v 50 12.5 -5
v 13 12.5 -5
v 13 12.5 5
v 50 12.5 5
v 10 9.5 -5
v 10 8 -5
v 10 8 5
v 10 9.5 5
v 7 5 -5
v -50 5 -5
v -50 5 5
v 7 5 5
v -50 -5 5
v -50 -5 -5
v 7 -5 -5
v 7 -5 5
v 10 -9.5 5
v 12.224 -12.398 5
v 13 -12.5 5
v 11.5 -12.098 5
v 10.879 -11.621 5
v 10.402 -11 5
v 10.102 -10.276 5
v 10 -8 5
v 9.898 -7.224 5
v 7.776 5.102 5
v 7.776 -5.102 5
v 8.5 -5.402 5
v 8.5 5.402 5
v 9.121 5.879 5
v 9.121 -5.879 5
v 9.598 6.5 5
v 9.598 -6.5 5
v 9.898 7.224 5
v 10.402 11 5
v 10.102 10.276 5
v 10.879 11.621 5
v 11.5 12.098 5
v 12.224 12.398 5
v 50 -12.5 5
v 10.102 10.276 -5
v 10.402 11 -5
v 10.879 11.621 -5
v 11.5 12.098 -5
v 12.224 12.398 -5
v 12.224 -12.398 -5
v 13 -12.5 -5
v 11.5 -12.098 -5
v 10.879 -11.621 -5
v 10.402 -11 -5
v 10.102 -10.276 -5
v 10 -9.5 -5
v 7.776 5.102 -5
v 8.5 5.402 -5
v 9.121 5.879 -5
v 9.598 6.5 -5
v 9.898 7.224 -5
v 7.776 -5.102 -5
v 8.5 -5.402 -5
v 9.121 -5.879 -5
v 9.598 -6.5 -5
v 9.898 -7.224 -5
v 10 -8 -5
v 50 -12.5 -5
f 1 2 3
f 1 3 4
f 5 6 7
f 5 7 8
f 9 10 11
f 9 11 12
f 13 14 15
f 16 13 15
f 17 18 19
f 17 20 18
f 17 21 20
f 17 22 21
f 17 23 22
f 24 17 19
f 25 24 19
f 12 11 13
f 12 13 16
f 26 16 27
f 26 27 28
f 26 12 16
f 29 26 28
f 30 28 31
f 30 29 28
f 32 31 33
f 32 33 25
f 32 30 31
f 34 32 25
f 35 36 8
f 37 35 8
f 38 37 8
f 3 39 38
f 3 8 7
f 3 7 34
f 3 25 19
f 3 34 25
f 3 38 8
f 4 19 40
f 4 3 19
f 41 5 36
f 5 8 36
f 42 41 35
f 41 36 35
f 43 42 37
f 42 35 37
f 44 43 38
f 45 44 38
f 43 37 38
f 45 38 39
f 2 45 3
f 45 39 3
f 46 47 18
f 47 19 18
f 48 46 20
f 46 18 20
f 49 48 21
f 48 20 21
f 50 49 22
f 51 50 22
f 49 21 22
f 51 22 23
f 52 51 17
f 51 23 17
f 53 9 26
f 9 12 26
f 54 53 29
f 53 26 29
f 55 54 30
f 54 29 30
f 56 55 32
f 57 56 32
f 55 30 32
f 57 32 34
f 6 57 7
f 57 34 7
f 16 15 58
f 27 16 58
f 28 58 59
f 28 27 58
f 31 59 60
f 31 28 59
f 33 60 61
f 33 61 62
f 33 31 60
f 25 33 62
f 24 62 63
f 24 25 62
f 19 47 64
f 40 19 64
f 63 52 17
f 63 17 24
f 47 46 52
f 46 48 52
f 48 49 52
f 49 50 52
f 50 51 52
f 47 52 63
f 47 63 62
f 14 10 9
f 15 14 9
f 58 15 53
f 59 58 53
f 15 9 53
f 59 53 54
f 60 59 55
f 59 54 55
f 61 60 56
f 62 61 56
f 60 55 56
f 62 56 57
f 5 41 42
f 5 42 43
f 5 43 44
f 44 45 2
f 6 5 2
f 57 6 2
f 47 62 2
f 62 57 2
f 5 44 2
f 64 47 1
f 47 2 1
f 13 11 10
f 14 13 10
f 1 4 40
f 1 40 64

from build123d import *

# Parameters (mm, degrees)
SKETCH2_W               = 100
SKETCH2_H               = 10
BOSS_EXTRUDE2_DEPTH     = 12.5
CUT_EXTRUDE3_DEPTH      = 53.5
CUT_EXTRUDE3_DEPTH_BACK = 53.5
SKETCH6_W               = 60
SKETCH6_H               = 7.5
FILLET2_R               = 3


with BuildPart() as part:
    # Sketch2 → Boss-Extrude2 (new, symmetric)
    with BuildSketch(Plane(origin=(0, 0, 0), x_dir=(1, 0, 0), z_dir=(0, 1, 0))):
        Rectangle(SKETCH2_W, SKETCH2_H)
    extrude(amount=BOSS_EXTRUDE2_DEPTH, both=True)

    # Sketch6 → Cut-Extrude3 (cut, two sides: drawn at the far end of the back side and taken through both)
    with BuildSketch(Plane.XY.offset(5).offset(-CUT_EXTRUDE3_DEPTH_BACK)):
        with Locations((-20, 8.75)):
            Rectangle(SKETCH6_W, SKETCH6_H)
        with Locations((-20, -8.75)):
            Rectangle(SKETCH6_W, SKETCH6_H)
    extrude(amount=CUT_EXTRUDE3_DEPTH + CUT_EXTRUDE3_DEPTH_BACK, mode=Mode.SUBTRACT)

    # Fillet2
    fillet2_edges = [part.edges().sort_by_distance(p)[0] for p in [
        (10, 5, 0),
        (10, 12.5, 0),
        (10, -12.5, 0),
        (10, -5, 0),
    ]]
    fillet(fillet2_edges, radius=FILLET2_R)


solid = part.part
